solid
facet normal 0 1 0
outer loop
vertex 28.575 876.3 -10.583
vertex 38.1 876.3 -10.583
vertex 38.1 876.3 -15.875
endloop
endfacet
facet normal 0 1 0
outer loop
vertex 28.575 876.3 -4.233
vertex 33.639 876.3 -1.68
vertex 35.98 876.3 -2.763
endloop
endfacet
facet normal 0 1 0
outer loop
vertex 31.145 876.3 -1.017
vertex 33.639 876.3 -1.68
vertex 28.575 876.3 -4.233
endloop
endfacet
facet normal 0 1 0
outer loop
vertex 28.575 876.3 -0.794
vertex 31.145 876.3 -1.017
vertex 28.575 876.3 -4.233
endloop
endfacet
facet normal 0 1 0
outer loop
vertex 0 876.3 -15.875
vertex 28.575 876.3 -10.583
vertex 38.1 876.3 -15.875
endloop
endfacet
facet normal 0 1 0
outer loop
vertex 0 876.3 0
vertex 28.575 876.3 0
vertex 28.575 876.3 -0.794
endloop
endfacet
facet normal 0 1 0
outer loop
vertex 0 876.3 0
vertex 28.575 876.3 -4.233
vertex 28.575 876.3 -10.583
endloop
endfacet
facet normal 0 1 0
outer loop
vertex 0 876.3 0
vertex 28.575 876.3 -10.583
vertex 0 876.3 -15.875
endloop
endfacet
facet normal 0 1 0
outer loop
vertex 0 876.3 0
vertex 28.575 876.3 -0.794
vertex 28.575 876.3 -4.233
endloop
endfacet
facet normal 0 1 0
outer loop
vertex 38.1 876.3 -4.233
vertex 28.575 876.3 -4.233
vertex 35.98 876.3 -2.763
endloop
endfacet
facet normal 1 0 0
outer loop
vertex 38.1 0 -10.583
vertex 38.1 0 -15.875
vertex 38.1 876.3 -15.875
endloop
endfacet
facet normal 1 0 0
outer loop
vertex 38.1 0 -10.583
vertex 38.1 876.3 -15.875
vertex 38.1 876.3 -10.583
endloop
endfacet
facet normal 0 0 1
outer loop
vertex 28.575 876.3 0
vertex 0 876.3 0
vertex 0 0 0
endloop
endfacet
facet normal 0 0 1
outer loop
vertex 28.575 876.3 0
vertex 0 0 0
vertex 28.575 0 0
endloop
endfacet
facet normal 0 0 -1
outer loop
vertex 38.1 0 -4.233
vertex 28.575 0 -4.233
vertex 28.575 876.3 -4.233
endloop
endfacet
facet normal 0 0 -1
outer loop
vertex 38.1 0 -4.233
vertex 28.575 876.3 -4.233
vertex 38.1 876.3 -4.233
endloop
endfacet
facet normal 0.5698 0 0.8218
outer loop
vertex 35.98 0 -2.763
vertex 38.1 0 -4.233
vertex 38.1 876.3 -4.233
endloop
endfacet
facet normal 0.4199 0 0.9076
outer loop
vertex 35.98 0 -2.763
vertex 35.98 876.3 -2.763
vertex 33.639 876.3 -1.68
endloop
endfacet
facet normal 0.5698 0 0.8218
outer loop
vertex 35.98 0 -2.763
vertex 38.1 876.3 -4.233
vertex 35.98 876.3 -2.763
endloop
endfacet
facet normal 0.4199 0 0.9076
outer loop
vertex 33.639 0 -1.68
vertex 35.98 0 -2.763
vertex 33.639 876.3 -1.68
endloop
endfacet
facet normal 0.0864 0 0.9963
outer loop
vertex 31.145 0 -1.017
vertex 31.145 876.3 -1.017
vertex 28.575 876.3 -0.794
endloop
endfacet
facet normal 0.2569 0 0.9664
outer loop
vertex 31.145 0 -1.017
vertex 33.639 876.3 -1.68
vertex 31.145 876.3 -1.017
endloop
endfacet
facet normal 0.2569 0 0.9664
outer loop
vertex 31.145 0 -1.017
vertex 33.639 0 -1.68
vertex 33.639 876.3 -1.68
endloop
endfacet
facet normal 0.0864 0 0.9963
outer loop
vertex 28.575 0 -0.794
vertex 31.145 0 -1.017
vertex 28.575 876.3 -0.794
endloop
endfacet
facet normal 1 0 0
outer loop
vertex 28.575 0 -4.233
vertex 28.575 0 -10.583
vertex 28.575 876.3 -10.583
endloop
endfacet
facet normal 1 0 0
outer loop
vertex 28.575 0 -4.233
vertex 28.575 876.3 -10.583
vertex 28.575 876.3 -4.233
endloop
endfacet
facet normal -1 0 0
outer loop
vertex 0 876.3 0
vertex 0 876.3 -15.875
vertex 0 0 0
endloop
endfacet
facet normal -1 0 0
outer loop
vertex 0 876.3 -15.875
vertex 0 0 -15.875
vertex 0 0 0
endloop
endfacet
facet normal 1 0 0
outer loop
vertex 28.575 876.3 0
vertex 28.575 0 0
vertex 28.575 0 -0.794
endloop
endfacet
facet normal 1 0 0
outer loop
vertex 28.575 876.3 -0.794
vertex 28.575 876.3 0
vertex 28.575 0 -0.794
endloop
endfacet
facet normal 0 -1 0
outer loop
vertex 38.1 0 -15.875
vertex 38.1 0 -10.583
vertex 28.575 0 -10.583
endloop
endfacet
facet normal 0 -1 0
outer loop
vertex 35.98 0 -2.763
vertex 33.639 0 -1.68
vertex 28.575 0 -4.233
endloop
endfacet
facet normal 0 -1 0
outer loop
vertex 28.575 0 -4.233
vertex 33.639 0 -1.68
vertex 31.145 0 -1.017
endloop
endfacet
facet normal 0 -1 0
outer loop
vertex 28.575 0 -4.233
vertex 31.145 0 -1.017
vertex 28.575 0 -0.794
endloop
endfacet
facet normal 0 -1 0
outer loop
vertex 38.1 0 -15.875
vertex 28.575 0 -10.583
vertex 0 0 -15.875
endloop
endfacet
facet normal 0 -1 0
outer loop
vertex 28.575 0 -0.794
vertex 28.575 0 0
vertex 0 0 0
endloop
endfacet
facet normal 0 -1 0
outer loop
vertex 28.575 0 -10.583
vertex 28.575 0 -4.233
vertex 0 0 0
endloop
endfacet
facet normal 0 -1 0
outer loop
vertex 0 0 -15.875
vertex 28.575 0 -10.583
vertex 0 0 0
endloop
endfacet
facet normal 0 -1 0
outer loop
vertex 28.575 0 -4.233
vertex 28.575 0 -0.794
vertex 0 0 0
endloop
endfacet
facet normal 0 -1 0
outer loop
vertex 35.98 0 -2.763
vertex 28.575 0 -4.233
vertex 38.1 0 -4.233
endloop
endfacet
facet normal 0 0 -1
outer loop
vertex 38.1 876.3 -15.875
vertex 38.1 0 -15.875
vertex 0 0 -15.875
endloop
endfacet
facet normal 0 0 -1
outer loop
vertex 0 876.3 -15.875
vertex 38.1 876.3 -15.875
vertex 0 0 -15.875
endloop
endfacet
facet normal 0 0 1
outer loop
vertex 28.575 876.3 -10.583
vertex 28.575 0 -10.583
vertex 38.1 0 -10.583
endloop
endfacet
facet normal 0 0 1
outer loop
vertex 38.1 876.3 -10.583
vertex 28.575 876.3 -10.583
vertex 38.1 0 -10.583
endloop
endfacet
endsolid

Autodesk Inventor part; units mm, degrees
ref_plane "YZ Plane" through (0, 0, 0) normal (1, 0, 0) x (0, 1, 0)
ref_plane "XZ Plane" through (0, 0, 0) normal (0, 1, 0) x (-1, 0, 0)
ref_plane "XY Plane" through (0, 0, 0) normal (0, 0, 1) x (1, 0, 0)
sketch "Sketch1" plane through (0, 0, 0) normal (0, 1, 0) x (-1, 0, 0)
  line L0 (0, 0) -> (-32.8112, 0)
  line L1 (-38.1, -15.875) -> (0, -15.875)
  line L2 (0, -15.875) -> (0, 0)
  line L3 (0, -15.875) -> (-38.1, -15.875)
  line L4 (-38.1, -15.875) -> (-38.1, -10.5833)
  line L5 (0, -17.5053) -> (0, -15.875)
  line L6 (-28.575, -10.5833) -> (-28.575, -4.2333)
  line L7 (0, -12.2137) -> (0, -17.5053)
  line L8 (-28.575, -4.2333) -> (-38.1, -4.2333)
  line L9 (-38.1, -10.5833) -> (-38.1, -15.875)
  line L10 (-28.575, -10.5833) -> (-38.1, -10.5833)
  line L11 (0, 0) -> (-28.575, 0)
  line L12 (-28.575, 0) -> (-28.575, -0.7937)
  line L13 (-28.575, -0.7937) -> (0, -0.7937)
  line L14 (0, -0.7937) -> (0, 0)
  arc A0 (-28.575, -0.7937) -> (-38.1, -4.2333) centre (-28.575, -15.702) ccw
  dimension "d0" = 38.1
  dimension "d5" = 9.525
  dimension "d6" = 0.7937
  dimension "d10" = 9.525
  dimension "d11" = 28.575
  dimension "d13" = 15.875
  dimension "d14" = 14.9083
  dimension "d15" = 6.35
extrude "Extrusion1" add sketch "Sketch1" along normal blind 876.3
equation "\"d5\" = d10"
properties part number "Cabinet Moulding Long"
